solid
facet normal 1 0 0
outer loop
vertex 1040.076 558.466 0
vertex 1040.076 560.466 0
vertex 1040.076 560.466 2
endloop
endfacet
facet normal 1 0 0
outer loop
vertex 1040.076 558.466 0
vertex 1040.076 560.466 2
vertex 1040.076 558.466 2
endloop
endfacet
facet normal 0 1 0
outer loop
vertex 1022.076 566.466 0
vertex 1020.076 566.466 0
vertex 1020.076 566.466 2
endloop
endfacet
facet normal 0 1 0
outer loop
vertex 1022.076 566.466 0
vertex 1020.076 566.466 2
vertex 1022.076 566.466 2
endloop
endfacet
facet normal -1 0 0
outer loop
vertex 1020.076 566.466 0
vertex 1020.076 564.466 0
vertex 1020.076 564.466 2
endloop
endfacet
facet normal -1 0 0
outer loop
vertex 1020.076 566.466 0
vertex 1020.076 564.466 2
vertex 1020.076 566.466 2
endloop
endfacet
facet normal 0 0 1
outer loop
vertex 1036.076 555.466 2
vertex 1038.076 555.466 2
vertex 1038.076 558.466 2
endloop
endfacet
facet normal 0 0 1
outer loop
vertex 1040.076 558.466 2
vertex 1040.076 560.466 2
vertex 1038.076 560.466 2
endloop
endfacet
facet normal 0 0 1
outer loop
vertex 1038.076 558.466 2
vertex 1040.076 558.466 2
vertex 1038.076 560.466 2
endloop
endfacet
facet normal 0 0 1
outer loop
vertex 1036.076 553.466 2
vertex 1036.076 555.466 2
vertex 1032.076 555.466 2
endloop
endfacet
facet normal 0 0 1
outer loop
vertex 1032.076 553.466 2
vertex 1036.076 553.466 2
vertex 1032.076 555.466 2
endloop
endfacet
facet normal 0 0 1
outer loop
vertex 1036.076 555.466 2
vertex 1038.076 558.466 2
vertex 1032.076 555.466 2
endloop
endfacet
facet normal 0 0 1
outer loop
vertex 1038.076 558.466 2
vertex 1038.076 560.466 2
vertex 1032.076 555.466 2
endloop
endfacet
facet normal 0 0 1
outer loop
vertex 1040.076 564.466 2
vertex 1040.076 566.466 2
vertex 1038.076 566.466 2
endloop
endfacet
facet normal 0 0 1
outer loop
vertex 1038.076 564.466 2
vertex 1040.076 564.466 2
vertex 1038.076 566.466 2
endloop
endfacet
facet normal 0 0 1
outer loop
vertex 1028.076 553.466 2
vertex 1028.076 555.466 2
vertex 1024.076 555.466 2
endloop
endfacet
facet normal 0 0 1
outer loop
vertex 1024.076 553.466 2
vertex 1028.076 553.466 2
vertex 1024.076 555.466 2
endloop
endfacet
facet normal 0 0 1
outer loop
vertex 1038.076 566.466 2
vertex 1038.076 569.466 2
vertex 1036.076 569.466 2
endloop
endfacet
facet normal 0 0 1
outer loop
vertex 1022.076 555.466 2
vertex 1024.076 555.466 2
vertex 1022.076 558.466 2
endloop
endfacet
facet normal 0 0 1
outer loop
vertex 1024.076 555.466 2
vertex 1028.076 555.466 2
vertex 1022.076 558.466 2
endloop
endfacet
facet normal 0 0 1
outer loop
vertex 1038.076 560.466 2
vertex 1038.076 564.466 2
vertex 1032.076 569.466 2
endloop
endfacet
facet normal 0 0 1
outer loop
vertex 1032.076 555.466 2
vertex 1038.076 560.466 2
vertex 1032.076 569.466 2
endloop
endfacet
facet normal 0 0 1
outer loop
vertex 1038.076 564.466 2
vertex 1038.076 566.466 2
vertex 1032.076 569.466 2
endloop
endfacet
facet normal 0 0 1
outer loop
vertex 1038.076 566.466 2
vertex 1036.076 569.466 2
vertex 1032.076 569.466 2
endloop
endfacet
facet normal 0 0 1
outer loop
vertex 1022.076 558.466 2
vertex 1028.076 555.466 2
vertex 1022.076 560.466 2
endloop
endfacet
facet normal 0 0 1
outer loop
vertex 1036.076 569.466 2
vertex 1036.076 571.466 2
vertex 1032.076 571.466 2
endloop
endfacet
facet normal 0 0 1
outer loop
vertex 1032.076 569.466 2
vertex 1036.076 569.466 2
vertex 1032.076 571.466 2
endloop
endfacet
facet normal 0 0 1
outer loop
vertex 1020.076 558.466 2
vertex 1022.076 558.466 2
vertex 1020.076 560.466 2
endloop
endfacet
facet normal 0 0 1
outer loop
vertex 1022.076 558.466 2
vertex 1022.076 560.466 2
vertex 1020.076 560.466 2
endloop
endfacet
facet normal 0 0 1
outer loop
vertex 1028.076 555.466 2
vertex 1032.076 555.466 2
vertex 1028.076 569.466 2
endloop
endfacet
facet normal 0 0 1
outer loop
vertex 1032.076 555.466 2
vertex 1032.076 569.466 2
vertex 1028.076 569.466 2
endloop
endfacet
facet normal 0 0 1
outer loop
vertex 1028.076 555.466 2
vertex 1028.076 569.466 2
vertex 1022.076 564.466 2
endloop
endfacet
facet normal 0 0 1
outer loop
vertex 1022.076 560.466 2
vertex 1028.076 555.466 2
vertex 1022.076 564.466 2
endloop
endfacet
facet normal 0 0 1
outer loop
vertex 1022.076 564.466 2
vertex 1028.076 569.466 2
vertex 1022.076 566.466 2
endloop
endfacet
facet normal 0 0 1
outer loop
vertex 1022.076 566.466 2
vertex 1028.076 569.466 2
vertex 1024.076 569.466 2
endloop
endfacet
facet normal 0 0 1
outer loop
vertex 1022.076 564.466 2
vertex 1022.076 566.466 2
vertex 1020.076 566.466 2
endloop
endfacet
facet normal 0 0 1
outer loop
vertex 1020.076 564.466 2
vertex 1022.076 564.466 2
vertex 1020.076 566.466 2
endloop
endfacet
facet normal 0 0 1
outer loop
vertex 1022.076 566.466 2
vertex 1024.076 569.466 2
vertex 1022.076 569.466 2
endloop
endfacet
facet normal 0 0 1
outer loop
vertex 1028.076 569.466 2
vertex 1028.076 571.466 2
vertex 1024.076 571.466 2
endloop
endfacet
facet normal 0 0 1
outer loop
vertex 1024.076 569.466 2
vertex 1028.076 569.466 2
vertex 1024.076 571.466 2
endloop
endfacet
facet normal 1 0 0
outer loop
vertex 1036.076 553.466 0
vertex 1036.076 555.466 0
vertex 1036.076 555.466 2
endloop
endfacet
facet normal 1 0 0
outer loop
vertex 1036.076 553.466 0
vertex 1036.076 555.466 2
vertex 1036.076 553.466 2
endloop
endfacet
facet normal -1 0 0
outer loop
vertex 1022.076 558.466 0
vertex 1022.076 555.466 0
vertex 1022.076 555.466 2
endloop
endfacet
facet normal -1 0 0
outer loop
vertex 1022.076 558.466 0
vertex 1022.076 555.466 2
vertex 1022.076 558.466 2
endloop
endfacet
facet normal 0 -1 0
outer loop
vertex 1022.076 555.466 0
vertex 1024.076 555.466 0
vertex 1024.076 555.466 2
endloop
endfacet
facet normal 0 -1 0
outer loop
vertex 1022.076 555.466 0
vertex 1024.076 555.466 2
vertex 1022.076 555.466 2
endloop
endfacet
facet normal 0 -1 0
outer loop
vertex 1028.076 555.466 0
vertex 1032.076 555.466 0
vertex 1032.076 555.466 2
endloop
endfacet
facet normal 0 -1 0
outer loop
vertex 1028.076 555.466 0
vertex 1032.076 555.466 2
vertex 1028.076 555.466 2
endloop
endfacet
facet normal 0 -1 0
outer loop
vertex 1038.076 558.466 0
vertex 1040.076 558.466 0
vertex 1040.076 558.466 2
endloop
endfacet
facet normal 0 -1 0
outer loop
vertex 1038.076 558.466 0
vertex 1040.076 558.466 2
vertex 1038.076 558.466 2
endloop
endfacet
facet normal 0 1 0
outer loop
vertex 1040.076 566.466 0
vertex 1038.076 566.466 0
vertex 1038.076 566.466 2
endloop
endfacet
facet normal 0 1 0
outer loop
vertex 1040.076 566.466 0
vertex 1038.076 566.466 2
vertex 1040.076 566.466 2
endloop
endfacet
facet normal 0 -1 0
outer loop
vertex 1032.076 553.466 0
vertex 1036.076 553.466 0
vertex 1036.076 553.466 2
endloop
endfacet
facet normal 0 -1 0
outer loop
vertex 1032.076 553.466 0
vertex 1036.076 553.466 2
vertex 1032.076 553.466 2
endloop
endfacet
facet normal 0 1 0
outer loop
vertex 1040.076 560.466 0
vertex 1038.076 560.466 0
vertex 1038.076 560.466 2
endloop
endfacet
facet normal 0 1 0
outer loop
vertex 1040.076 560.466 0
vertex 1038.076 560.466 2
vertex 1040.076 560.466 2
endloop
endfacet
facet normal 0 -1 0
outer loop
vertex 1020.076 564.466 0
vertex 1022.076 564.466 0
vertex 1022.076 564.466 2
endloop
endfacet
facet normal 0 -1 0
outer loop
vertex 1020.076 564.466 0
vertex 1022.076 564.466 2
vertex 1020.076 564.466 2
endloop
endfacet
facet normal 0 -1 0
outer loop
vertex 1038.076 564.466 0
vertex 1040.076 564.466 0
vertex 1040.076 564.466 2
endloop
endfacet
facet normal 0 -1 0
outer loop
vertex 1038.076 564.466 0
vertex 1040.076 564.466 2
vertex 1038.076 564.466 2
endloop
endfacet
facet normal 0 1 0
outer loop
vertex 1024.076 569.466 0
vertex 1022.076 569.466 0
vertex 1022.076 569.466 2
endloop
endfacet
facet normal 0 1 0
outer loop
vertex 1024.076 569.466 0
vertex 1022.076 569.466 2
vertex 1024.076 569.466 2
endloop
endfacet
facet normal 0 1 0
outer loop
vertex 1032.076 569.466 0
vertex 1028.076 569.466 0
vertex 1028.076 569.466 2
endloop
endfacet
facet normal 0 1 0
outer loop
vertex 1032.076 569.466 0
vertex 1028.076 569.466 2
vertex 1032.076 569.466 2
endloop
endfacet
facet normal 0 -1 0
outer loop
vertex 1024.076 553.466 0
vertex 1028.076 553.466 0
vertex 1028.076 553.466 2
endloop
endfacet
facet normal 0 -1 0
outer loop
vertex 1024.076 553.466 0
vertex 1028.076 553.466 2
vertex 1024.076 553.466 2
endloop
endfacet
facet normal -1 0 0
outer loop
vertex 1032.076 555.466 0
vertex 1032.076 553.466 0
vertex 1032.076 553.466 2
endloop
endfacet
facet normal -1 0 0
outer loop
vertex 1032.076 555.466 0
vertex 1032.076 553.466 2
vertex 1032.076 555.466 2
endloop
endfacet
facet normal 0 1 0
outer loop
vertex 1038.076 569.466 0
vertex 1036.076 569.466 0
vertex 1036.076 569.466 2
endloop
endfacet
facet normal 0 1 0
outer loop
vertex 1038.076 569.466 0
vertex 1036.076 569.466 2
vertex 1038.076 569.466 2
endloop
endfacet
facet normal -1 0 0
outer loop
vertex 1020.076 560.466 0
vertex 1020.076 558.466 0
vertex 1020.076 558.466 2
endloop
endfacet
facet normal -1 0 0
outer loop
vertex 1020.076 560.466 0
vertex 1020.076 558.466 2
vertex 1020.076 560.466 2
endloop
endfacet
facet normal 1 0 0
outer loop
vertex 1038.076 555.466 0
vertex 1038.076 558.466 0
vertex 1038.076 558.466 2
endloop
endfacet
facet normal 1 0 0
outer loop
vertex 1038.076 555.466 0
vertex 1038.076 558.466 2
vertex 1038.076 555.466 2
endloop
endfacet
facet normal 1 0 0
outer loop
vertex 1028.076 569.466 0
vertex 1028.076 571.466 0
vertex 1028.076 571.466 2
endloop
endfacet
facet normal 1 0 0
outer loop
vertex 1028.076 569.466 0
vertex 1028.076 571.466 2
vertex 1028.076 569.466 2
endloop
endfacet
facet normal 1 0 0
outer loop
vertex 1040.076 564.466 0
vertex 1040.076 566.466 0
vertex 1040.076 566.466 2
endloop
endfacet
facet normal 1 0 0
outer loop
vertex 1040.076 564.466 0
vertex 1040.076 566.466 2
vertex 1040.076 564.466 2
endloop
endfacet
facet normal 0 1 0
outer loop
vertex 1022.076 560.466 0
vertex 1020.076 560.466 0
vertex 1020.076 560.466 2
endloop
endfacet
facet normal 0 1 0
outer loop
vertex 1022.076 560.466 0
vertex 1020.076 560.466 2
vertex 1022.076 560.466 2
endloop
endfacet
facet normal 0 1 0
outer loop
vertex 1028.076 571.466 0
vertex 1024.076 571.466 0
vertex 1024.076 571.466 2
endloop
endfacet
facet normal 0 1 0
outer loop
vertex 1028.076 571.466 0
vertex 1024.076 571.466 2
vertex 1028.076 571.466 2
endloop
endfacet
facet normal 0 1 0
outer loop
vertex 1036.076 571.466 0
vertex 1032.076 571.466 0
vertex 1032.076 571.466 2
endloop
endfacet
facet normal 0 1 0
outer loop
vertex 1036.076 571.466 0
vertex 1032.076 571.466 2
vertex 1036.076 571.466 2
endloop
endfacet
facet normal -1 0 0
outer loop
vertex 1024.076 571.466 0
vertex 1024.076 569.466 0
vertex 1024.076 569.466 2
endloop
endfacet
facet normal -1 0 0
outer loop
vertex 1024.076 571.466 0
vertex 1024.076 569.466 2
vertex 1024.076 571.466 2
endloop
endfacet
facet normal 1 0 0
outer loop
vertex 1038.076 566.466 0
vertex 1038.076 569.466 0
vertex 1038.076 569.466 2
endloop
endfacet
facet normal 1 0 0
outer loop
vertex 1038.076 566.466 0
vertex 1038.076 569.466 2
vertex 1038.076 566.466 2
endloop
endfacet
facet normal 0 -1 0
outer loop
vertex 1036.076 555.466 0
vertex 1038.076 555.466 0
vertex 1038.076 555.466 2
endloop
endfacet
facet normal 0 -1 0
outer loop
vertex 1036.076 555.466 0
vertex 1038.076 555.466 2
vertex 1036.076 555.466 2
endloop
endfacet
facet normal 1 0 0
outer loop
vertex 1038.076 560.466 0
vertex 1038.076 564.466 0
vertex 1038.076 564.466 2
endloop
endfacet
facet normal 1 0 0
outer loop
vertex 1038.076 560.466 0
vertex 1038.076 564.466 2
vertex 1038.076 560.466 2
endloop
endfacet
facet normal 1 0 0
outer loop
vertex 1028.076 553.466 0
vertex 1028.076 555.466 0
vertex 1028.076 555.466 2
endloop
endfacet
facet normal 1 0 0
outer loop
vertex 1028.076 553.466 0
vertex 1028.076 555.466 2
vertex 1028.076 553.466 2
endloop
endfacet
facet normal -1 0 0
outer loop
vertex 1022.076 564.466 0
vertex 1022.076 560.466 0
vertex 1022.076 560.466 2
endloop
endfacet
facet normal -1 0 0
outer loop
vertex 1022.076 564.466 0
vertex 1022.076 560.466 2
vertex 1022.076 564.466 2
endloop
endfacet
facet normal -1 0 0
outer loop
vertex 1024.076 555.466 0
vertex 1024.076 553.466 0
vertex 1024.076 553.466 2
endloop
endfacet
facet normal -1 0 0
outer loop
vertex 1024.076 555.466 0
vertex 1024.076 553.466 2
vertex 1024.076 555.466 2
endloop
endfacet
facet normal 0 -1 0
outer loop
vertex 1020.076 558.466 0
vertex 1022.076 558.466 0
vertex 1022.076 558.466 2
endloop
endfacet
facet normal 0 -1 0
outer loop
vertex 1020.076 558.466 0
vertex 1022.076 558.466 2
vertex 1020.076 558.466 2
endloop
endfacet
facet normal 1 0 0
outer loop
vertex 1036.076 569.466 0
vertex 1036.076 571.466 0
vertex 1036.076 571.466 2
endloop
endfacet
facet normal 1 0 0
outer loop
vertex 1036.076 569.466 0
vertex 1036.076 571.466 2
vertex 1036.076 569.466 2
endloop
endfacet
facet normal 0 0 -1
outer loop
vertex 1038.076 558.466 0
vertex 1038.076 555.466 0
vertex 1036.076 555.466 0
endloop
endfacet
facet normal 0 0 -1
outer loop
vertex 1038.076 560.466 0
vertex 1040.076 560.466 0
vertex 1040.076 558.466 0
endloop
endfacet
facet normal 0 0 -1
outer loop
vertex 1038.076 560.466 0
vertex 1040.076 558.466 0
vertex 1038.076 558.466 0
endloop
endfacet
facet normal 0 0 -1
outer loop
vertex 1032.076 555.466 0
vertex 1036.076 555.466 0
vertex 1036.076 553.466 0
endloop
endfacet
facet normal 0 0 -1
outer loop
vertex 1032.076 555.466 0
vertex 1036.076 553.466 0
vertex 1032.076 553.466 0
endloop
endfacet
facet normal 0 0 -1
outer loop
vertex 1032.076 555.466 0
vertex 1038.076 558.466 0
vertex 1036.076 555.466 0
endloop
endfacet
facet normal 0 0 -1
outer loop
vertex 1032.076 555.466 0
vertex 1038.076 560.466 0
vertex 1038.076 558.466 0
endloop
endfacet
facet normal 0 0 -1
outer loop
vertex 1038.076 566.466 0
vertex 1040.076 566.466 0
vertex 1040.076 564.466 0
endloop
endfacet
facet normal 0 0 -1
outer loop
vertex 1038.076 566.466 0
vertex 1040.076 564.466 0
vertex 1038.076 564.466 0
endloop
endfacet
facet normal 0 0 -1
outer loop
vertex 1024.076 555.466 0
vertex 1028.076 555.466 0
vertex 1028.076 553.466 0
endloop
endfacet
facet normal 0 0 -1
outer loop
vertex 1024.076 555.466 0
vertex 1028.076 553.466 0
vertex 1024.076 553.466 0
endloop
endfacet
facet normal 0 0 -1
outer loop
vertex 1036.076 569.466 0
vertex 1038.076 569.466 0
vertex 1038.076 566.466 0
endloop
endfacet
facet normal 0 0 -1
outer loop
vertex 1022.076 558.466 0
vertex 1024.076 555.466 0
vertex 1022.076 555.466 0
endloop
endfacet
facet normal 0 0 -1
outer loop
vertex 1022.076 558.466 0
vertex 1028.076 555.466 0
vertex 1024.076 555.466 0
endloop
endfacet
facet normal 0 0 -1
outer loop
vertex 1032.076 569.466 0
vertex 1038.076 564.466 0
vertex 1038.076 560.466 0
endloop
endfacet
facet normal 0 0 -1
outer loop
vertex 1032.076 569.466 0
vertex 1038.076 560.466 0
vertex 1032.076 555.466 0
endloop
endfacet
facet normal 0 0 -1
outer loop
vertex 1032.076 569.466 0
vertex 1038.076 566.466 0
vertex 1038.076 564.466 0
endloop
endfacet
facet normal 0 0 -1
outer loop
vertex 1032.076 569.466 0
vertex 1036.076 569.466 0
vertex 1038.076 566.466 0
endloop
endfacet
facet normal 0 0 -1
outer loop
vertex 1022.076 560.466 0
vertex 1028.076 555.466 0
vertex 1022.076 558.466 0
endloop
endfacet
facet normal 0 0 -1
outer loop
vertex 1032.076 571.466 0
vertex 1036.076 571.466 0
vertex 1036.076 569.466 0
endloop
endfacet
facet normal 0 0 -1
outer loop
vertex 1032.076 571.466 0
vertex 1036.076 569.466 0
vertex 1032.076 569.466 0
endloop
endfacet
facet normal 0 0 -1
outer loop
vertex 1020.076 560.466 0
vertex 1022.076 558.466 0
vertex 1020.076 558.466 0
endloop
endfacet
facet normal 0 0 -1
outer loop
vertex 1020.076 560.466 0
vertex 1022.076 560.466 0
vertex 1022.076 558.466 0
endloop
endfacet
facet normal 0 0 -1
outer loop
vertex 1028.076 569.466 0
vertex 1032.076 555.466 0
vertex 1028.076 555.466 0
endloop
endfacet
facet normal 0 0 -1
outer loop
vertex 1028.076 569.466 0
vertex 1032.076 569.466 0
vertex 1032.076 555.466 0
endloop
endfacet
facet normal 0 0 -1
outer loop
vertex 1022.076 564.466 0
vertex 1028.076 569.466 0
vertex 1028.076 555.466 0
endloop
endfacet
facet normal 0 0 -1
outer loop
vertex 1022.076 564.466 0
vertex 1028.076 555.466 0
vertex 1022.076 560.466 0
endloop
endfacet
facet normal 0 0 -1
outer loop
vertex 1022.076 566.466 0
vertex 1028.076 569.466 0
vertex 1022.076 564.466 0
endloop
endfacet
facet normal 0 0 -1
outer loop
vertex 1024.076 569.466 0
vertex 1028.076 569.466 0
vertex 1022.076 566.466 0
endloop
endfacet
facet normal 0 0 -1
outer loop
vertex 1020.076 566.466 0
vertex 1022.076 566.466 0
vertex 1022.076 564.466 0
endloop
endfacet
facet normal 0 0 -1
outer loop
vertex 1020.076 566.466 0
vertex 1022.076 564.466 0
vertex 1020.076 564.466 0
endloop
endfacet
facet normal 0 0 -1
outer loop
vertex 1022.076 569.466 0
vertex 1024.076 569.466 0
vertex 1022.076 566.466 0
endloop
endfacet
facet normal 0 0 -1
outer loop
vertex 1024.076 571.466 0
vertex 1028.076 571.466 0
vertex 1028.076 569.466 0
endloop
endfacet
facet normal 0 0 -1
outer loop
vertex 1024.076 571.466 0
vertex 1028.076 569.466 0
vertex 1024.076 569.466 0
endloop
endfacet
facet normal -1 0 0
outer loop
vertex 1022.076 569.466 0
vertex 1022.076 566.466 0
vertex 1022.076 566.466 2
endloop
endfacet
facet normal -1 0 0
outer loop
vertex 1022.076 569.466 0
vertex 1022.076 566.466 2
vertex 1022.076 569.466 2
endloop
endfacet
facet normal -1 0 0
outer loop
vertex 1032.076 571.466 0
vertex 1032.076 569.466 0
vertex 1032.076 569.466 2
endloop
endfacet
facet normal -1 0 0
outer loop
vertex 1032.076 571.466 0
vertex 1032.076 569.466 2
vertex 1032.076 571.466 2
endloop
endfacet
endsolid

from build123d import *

# Parameters (mm, degrees)
EXTRUDE_1_DEPTH = 2


with BuildPart() as part:
    # Model → 凸台-拉伸1 (new body)
    with BuildSketch(Plane.XY):
        Polygon((1022.075950507, 566.466158611), (1022.075950507, 569.466158611), (1024.075950507, 569.466158611), (1024.075950507, 571.466158611), (1028.075950507, 571.466158611), (1028.075950507, 569.466158611), (1032.075950507, 569.466158611), (1032.075950507, 571.466158611), (1036.075950507, 571.466158611), (1036.075950507, 569.466158611), (1038.075950507, 569.466158611), (1038.075950507, 566.466158611), (1040.075950507, 566.466158611), (1040.075950507, 564.466158611), (1038.075950507, 564.466158611), (1038.075950507, 560.466158611), (1040.075950507, 560.466158611), (1040.075950507, 558.466158611), (1038.075950507, 558.466158611), (1038.075950507, 555.466158611), (1036.075950507, 555.466158611), (1036.075950507, 553.466158611), (1032.075950507, 553.466158611), (1032.075950507, 555.466158611), (1028.075950507, 555.466158611), (1028.075950507, 553.466158611), (1024.075950507, 553.466158611), (1024.075950507, 555.466158611), (1022.075950507, 555.466158611), (1022.075950507, 558.466158611), (1020.075950507, 558.466158611), (1020.075950507, 560.466158611), (1022.075950507, 560.466158611), (1022.075950507, 564.466158611), (1020.075950507, 564.466158611), (1020.075950507, 566.466158611), align=None)
    extrude(amount=EXTRUDE_1_DEPTH)


solid = part.part
